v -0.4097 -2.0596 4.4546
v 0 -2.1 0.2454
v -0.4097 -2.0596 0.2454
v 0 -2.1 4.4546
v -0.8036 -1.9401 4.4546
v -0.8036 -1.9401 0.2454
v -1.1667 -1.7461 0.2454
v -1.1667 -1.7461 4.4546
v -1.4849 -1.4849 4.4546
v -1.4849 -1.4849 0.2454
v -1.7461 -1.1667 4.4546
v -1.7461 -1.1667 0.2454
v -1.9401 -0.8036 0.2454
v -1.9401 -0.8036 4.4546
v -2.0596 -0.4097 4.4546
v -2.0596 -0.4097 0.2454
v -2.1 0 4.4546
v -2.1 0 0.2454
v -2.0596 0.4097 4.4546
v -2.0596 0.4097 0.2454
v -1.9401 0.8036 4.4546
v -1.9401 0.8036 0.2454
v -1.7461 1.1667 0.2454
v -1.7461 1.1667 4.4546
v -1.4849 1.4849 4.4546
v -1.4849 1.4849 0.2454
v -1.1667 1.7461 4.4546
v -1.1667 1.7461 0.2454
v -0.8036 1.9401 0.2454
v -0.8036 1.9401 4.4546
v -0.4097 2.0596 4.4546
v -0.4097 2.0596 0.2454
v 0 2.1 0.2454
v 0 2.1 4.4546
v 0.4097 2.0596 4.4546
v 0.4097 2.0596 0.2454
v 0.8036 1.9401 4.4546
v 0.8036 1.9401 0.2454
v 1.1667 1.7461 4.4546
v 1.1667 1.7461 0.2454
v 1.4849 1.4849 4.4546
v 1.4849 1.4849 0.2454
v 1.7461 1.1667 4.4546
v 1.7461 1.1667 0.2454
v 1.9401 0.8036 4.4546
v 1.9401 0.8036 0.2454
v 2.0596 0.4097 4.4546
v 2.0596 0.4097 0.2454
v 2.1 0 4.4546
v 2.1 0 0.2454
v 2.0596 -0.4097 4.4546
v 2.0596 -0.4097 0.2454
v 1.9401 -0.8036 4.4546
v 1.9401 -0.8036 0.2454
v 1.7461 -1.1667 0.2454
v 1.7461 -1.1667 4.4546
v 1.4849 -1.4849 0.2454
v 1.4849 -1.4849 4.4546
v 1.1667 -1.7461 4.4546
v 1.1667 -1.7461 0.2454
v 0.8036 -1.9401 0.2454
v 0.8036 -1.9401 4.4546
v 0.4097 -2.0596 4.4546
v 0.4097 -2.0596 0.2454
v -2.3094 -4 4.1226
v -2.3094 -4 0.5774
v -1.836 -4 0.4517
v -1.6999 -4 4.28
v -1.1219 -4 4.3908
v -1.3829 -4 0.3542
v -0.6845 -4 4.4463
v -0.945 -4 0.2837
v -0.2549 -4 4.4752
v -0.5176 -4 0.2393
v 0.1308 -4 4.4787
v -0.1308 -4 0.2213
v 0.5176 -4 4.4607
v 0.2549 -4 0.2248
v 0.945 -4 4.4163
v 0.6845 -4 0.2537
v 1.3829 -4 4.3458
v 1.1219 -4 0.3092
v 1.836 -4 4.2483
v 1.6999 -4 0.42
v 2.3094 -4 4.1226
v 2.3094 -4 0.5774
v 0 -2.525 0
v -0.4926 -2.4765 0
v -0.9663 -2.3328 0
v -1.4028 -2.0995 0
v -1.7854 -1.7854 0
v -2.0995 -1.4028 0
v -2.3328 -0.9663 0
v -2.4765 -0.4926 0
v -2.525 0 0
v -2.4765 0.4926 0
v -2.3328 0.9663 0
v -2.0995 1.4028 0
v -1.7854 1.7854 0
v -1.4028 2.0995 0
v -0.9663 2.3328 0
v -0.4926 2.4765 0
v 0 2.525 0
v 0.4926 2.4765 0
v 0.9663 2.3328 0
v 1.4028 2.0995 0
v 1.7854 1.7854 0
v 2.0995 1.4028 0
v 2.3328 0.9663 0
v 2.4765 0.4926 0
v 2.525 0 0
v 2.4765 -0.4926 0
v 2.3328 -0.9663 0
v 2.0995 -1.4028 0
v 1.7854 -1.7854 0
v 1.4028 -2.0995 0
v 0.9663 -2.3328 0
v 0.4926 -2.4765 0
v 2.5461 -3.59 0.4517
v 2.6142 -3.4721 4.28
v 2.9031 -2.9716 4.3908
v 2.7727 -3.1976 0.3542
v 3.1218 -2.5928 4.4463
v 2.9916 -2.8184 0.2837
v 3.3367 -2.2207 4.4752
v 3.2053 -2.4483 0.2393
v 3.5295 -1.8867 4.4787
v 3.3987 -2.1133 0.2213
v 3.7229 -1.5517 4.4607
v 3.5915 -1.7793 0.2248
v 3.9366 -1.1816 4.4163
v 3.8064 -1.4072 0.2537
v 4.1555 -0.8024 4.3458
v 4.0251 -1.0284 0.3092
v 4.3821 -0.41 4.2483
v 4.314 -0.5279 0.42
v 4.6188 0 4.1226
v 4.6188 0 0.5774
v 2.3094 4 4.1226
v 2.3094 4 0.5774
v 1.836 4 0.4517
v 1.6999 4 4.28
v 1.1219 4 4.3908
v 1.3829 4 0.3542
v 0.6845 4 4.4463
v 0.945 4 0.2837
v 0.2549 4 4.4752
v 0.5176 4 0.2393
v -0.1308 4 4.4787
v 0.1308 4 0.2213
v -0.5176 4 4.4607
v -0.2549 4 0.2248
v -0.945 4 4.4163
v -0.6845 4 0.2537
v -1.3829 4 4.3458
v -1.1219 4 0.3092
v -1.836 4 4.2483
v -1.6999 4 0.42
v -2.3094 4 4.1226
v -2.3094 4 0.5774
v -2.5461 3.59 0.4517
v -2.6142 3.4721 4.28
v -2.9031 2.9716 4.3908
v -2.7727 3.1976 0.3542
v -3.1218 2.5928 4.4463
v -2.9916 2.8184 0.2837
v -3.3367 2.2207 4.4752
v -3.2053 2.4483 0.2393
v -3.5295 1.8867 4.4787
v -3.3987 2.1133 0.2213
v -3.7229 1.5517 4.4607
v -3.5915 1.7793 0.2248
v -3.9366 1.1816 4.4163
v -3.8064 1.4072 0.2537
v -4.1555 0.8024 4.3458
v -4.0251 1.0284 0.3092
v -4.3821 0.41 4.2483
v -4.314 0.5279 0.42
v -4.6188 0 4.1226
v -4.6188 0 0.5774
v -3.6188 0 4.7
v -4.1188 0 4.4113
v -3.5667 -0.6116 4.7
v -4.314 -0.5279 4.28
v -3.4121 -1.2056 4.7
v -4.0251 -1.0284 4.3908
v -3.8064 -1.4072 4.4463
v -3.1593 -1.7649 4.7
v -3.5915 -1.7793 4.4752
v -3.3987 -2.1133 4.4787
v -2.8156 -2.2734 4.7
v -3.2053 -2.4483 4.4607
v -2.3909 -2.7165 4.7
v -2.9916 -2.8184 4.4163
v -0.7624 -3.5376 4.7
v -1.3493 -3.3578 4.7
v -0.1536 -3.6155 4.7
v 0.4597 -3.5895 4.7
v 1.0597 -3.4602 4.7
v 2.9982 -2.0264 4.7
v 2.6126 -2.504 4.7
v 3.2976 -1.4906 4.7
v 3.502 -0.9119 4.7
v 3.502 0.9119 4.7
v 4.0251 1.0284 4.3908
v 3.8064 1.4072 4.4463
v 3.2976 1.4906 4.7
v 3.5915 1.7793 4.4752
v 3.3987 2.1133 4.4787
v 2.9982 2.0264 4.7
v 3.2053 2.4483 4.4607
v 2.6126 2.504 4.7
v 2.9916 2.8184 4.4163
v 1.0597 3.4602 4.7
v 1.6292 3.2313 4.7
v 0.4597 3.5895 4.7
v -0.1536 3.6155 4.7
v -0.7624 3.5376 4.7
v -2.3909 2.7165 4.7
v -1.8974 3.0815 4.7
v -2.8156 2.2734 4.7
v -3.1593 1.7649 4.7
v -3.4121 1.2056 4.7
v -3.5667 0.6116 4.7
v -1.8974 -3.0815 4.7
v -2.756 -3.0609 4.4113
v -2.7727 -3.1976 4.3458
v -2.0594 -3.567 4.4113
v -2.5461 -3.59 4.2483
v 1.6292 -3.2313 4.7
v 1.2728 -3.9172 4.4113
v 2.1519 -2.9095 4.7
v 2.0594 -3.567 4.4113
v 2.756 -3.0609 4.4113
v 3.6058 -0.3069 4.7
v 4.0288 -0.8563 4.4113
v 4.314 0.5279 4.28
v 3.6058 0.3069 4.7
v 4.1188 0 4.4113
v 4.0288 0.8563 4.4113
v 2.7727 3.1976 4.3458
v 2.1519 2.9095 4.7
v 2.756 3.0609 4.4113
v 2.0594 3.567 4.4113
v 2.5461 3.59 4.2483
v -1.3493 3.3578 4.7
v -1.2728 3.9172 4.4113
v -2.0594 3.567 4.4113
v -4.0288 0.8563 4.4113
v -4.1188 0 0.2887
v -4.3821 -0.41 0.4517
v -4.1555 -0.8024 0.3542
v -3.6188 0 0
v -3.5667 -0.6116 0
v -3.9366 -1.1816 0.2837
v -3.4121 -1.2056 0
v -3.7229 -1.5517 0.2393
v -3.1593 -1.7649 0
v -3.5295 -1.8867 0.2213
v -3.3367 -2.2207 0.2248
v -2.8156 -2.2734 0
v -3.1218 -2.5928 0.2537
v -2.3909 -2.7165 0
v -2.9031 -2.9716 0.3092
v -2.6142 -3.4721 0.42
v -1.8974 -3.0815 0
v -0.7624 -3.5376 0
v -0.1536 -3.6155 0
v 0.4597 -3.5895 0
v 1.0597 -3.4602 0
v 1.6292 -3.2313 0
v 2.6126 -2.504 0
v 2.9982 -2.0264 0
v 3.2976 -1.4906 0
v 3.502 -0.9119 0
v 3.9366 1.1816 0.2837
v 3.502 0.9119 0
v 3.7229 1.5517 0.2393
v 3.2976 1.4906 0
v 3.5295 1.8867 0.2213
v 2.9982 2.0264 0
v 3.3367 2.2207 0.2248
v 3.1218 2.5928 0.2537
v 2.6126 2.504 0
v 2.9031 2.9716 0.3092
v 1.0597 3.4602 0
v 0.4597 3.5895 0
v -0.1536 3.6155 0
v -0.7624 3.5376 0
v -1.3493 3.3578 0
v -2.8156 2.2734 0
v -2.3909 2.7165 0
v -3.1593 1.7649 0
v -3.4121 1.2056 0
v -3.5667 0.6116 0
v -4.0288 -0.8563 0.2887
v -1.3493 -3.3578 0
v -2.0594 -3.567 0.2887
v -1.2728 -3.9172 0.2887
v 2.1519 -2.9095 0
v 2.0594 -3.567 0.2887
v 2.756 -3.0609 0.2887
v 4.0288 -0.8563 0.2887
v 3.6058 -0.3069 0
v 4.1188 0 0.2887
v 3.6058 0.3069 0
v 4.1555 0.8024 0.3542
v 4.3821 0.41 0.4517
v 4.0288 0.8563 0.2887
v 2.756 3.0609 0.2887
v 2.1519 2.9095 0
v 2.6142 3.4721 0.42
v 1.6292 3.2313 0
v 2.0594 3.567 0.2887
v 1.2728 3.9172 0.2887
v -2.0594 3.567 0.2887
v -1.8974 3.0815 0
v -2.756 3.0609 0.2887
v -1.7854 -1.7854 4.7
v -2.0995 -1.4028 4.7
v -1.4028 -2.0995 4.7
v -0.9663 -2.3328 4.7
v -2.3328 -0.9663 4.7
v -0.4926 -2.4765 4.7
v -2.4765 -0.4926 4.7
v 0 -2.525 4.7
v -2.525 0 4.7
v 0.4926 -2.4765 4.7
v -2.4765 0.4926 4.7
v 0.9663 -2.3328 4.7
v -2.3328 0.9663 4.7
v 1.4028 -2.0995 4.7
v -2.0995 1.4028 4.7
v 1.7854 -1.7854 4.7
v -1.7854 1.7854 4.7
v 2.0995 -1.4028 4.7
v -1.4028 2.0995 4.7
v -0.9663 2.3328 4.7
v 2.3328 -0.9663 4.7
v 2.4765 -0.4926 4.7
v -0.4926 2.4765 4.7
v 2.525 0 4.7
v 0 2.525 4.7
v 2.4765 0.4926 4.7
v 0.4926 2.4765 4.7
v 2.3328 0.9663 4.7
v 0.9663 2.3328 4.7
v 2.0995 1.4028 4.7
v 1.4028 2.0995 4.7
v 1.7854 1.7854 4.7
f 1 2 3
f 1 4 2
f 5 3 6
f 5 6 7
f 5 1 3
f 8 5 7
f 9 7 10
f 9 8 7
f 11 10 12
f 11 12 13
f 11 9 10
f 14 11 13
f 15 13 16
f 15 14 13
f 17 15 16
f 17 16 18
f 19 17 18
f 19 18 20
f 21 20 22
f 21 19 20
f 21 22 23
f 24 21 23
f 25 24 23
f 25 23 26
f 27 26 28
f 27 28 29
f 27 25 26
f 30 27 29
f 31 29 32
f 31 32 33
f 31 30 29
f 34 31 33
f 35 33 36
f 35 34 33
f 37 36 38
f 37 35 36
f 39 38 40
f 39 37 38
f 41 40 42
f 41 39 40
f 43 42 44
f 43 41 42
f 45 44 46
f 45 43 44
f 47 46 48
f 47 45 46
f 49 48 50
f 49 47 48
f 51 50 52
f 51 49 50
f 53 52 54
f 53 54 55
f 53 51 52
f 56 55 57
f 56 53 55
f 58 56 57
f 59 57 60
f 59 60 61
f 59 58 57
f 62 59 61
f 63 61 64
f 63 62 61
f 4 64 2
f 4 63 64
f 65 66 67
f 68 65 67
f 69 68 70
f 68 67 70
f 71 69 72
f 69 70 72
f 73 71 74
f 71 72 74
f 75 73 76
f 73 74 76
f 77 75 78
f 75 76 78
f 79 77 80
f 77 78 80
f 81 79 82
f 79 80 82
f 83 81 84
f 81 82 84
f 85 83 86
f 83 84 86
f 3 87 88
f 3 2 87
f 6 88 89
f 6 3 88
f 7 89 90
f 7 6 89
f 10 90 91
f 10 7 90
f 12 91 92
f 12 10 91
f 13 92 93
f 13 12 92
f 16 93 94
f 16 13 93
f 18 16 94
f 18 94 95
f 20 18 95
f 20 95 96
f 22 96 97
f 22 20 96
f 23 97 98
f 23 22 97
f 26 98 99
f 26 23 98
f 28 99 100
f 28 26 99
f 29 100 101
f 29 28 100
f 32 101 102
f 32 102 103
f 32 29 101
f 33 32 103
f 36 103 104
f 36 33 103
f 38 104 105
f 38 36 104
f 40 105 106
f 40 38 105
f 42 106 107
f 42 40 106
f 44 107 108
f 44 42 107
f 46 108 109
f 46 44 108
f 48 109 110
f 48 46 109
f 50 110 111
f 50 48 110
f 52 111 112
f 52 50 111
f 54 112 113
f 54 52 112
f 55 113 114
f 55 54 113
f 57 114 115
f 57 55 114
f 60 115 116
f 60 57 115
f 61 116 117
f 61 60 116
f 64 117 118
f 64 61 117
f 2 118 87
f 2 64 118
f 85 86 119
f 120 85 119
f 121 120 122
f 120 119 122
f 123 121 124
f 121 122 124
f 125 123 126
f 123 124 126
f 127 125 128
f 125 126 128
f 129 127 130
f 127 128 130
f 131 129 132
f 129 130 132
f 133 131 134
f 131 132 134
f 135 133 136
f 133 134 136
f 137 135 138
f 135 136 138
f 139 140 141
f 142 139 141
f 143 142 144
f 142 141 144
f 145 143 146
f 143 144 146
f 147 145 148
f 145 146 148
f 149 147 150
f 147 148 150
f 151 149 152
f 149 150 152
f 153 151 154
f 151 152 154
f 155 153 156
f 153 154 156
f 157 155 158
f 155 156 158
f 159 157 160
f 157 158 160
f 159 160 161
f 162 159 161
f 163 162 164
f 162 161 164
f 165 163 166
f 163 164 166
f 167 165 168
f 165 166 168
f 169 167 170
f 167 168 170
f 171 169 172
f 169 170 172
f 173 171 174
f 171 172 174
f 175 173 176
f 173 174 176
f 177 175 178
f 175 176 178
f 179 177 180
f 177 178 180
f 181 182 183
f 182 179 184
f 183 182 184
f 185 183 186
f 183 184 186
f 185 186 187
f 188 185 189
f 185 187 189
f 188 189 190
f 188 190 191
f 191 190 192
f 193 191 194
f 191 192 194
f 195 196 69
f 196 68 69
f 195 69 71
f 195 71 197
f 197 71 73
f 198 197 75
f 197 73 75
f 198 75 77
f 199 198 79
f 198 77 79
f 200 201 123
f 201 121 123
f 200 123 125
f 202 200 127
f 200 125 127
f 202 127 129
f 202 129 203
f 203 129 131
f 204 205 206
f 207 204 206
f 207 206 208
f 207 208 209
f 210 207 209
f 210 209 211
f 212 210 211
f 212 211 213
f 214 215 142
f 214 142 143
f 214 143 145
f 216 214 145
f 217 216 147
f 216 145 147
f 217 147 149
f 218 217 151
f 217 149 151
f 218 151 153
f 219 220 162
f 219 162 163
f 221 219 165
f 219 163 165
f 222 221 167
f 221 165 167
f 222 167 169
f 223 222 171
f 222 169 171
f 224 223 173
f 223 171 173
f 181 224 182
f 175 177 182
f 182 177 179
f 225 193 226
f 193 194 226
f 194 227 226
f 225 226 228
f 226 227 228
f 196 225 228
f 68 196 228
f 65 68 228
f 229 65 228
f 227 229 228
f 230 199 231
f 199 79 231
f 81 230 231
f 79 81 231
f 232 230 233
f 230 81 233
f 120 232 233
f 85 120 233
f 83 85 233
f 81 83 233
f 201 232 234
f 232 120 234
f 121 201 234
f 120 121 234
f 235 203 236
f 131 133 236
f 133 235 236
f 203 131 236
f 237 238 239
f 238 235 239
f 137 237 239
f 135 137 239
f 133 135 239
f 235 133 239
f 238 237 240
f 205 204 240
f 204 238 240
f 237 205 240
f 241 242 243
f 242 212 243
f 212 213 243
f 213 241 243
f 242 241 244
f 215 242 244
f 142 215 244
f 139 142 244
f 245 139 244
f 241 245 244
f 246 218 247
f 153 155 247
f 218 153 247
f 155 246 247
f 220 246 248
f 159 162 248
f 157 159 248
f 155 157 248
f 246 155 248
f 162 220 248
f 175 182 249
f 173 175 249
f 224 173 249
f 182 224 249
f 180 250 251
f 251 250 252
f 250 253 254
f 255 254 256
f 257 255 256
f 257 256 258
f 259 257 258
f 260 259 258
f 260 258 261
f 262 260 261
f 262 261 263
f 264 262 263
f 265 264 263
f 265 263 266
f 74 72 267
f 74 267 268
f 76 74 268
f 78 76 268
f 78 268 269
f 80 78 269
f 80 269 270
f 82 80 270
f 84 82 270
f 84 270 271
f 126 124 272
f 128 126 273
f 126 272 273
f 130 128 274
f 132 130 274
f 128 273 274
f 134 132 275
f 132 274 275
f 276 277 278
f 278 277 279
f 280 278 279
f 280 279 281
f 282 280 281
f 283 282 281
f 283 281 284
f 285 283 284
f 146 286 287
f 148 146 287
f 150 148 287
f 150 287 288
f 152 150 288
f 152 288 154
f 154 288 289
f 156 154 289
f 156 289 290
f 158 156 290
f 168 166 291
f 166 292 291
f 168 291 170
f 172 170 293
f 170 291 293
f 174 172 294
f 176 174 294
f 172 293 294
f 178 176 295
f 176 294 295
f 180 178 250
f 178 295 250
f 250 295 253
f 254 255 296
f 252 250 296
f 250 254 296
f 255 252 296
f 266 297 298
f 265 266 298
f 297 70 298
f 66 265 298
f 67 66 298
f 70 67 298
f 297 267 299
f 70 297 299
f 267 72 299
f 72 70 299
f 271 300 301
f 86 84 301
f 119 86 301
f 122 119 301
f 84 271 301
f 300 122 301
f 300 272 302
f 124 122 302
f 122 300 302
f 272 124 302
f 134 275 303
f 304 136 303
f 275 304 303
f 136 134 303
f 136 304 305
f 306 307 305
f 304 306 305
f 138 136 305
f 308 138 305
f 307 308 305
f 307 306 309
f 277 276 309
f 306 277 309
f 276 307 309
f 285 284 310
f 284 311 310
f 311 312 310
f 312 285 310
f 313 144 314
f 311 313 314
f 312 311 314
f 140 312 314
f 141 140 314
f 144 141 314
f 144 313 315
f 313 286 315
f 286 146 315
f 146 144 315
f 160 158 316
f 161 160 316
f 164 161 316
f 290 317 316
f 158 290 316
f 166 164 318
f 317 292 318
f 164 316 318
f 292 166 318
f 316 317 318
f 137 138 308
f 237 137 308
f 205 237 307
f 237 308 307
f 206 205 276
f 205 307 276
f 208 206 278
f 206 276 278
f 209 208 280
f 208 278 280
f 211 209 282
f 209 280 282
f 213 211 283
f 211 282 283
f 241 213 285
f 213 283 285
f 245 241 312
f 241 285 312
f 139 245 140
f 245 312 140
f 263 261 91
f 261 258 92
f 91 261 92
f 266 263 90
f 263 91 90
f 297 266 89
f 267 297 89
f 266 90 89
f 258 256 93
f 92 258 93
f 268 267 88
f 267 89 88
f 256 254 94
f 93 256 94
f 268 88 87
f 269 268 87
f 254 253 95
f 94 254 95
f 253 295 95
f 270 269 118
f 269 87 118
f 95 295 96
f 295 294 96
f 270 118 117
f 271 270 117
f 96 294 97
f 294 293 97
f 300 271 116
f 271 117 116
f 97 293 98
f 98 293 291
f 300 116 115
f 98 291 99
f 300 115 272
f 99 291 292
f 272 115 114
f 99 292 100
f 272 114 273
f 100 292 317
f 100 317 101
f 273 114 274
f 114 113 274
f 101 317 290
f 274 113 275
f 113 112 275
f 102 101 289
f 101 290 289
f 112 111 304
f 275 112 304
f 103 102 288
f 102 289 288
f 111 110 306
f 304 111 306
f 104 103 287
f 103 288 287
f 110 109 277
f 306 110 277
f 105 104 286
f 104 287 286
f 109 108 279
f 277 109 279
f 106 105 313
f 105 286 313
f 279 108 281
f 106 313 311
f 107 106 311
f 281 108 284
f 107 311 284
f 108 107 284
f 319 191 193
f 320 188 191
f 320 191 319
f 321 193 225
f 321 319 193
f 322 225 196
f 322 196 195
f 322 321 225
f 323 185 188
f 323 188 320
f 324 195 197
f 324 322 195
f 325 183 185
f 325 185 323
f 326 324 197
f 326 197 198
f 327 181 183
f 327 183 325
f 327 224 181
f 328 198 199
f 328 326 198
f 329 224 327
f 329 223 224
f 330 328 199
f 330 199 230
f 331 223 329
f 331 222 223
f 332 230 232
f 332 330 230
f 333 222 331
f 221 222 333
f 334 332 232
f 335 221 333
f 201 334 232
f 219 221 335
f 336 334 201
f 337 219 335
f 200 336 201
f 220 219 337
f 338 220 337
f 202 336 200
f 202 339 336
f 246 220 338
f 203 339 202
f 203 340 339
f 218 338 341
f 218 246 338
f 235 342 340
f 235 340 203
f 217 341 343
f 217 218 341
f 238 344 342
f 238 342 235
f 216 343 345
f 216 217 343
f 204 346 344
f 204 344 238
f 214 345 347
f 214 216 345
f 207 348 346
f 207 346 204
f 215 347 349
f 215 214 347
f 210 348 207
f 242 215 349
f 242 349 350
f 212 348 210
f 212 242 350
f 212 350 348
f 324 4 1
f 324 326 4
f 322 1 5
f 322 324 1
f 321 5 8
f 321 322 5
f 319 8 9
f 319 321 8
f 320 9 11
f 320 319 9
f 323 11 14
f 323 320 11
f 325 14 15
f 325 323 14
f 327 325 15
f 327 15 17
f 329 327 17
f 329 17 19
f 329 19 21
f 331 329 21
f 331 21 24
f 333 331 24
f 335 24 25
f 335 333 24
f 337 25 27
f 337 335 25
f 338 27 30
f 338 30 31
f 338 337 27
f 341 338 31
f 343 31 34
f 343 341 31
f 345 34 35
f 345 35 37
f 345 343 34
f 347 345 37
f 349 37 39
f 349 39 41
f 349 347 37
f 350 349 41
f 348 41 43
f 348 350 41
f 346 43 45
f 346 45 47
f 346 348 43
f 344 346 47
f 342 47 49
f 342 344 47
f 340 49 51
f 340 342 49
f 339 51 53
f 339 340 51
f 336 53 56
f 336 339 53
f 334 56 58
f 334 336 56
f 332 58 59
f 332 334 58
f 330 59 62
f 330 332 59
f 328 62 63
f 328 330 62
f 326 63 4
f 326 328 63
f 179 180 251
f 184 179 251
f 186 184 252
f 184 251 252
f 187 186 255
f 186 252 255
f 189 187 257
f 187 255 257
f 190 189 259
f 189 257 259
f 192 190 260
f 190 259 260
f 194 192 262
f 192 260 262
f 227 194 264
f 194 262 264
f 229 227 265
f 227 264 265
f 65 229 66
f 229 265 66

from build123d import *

# Parameters (mm, degrees)
EXTRUDE_1_DEPTH = 4.7


with BuildPart() as part:
    # 草图1 → 凸台-拉伸1 (new body)
    with BuildSketch(Plane.XY):
        Polygon((2.309401077, 4), (-2.309401077, 4), (-4.618802154, 0), (-2.309401077, -4), (2.309401077, -4), (4.618802154, 0), align=None)
    extrude(amount=EXTRUDE_1_DEPTH)

    # 草图2 → M5 螺纹孔1 (revolve, cut)
    with BuildSketch(Plane(origin=(0, 0, 4.7), x_dir=(0, -1, 0), z_dir=(1, 0, 0))):
        Polygon((0, 0), (0, 4.7), (2.525, 4.7), (2.1, 4.454626136), (2.1, 0.245373864), (2.525, 0), align=None)
    revolve(axis=Axis((0, 0, 11.05), (0, 0, -1)), mode=Mode.SUBTRACT)

    # 草图4 → 切除-旋转1 (revolve, cut)
    with BuildSketch(Plane(origin=(0, 0, 0), x_dir=(1, 0, 0), z_dir=(0, 1, 0))):
        Polygon((-4.618802154, -0.577350269), (-3.618802154, 0), (-4.618802154, 0), align=None)
        Polygon((-4.618802154, -4.7), (-3.618802154, -4.7), (-4.618802154, -4.122649731), align=None)
    revolve(axis=Axis((0, 0, 0), (0, 0, 1)), mode=Mode.SUBTRACT)


solid = part.part
